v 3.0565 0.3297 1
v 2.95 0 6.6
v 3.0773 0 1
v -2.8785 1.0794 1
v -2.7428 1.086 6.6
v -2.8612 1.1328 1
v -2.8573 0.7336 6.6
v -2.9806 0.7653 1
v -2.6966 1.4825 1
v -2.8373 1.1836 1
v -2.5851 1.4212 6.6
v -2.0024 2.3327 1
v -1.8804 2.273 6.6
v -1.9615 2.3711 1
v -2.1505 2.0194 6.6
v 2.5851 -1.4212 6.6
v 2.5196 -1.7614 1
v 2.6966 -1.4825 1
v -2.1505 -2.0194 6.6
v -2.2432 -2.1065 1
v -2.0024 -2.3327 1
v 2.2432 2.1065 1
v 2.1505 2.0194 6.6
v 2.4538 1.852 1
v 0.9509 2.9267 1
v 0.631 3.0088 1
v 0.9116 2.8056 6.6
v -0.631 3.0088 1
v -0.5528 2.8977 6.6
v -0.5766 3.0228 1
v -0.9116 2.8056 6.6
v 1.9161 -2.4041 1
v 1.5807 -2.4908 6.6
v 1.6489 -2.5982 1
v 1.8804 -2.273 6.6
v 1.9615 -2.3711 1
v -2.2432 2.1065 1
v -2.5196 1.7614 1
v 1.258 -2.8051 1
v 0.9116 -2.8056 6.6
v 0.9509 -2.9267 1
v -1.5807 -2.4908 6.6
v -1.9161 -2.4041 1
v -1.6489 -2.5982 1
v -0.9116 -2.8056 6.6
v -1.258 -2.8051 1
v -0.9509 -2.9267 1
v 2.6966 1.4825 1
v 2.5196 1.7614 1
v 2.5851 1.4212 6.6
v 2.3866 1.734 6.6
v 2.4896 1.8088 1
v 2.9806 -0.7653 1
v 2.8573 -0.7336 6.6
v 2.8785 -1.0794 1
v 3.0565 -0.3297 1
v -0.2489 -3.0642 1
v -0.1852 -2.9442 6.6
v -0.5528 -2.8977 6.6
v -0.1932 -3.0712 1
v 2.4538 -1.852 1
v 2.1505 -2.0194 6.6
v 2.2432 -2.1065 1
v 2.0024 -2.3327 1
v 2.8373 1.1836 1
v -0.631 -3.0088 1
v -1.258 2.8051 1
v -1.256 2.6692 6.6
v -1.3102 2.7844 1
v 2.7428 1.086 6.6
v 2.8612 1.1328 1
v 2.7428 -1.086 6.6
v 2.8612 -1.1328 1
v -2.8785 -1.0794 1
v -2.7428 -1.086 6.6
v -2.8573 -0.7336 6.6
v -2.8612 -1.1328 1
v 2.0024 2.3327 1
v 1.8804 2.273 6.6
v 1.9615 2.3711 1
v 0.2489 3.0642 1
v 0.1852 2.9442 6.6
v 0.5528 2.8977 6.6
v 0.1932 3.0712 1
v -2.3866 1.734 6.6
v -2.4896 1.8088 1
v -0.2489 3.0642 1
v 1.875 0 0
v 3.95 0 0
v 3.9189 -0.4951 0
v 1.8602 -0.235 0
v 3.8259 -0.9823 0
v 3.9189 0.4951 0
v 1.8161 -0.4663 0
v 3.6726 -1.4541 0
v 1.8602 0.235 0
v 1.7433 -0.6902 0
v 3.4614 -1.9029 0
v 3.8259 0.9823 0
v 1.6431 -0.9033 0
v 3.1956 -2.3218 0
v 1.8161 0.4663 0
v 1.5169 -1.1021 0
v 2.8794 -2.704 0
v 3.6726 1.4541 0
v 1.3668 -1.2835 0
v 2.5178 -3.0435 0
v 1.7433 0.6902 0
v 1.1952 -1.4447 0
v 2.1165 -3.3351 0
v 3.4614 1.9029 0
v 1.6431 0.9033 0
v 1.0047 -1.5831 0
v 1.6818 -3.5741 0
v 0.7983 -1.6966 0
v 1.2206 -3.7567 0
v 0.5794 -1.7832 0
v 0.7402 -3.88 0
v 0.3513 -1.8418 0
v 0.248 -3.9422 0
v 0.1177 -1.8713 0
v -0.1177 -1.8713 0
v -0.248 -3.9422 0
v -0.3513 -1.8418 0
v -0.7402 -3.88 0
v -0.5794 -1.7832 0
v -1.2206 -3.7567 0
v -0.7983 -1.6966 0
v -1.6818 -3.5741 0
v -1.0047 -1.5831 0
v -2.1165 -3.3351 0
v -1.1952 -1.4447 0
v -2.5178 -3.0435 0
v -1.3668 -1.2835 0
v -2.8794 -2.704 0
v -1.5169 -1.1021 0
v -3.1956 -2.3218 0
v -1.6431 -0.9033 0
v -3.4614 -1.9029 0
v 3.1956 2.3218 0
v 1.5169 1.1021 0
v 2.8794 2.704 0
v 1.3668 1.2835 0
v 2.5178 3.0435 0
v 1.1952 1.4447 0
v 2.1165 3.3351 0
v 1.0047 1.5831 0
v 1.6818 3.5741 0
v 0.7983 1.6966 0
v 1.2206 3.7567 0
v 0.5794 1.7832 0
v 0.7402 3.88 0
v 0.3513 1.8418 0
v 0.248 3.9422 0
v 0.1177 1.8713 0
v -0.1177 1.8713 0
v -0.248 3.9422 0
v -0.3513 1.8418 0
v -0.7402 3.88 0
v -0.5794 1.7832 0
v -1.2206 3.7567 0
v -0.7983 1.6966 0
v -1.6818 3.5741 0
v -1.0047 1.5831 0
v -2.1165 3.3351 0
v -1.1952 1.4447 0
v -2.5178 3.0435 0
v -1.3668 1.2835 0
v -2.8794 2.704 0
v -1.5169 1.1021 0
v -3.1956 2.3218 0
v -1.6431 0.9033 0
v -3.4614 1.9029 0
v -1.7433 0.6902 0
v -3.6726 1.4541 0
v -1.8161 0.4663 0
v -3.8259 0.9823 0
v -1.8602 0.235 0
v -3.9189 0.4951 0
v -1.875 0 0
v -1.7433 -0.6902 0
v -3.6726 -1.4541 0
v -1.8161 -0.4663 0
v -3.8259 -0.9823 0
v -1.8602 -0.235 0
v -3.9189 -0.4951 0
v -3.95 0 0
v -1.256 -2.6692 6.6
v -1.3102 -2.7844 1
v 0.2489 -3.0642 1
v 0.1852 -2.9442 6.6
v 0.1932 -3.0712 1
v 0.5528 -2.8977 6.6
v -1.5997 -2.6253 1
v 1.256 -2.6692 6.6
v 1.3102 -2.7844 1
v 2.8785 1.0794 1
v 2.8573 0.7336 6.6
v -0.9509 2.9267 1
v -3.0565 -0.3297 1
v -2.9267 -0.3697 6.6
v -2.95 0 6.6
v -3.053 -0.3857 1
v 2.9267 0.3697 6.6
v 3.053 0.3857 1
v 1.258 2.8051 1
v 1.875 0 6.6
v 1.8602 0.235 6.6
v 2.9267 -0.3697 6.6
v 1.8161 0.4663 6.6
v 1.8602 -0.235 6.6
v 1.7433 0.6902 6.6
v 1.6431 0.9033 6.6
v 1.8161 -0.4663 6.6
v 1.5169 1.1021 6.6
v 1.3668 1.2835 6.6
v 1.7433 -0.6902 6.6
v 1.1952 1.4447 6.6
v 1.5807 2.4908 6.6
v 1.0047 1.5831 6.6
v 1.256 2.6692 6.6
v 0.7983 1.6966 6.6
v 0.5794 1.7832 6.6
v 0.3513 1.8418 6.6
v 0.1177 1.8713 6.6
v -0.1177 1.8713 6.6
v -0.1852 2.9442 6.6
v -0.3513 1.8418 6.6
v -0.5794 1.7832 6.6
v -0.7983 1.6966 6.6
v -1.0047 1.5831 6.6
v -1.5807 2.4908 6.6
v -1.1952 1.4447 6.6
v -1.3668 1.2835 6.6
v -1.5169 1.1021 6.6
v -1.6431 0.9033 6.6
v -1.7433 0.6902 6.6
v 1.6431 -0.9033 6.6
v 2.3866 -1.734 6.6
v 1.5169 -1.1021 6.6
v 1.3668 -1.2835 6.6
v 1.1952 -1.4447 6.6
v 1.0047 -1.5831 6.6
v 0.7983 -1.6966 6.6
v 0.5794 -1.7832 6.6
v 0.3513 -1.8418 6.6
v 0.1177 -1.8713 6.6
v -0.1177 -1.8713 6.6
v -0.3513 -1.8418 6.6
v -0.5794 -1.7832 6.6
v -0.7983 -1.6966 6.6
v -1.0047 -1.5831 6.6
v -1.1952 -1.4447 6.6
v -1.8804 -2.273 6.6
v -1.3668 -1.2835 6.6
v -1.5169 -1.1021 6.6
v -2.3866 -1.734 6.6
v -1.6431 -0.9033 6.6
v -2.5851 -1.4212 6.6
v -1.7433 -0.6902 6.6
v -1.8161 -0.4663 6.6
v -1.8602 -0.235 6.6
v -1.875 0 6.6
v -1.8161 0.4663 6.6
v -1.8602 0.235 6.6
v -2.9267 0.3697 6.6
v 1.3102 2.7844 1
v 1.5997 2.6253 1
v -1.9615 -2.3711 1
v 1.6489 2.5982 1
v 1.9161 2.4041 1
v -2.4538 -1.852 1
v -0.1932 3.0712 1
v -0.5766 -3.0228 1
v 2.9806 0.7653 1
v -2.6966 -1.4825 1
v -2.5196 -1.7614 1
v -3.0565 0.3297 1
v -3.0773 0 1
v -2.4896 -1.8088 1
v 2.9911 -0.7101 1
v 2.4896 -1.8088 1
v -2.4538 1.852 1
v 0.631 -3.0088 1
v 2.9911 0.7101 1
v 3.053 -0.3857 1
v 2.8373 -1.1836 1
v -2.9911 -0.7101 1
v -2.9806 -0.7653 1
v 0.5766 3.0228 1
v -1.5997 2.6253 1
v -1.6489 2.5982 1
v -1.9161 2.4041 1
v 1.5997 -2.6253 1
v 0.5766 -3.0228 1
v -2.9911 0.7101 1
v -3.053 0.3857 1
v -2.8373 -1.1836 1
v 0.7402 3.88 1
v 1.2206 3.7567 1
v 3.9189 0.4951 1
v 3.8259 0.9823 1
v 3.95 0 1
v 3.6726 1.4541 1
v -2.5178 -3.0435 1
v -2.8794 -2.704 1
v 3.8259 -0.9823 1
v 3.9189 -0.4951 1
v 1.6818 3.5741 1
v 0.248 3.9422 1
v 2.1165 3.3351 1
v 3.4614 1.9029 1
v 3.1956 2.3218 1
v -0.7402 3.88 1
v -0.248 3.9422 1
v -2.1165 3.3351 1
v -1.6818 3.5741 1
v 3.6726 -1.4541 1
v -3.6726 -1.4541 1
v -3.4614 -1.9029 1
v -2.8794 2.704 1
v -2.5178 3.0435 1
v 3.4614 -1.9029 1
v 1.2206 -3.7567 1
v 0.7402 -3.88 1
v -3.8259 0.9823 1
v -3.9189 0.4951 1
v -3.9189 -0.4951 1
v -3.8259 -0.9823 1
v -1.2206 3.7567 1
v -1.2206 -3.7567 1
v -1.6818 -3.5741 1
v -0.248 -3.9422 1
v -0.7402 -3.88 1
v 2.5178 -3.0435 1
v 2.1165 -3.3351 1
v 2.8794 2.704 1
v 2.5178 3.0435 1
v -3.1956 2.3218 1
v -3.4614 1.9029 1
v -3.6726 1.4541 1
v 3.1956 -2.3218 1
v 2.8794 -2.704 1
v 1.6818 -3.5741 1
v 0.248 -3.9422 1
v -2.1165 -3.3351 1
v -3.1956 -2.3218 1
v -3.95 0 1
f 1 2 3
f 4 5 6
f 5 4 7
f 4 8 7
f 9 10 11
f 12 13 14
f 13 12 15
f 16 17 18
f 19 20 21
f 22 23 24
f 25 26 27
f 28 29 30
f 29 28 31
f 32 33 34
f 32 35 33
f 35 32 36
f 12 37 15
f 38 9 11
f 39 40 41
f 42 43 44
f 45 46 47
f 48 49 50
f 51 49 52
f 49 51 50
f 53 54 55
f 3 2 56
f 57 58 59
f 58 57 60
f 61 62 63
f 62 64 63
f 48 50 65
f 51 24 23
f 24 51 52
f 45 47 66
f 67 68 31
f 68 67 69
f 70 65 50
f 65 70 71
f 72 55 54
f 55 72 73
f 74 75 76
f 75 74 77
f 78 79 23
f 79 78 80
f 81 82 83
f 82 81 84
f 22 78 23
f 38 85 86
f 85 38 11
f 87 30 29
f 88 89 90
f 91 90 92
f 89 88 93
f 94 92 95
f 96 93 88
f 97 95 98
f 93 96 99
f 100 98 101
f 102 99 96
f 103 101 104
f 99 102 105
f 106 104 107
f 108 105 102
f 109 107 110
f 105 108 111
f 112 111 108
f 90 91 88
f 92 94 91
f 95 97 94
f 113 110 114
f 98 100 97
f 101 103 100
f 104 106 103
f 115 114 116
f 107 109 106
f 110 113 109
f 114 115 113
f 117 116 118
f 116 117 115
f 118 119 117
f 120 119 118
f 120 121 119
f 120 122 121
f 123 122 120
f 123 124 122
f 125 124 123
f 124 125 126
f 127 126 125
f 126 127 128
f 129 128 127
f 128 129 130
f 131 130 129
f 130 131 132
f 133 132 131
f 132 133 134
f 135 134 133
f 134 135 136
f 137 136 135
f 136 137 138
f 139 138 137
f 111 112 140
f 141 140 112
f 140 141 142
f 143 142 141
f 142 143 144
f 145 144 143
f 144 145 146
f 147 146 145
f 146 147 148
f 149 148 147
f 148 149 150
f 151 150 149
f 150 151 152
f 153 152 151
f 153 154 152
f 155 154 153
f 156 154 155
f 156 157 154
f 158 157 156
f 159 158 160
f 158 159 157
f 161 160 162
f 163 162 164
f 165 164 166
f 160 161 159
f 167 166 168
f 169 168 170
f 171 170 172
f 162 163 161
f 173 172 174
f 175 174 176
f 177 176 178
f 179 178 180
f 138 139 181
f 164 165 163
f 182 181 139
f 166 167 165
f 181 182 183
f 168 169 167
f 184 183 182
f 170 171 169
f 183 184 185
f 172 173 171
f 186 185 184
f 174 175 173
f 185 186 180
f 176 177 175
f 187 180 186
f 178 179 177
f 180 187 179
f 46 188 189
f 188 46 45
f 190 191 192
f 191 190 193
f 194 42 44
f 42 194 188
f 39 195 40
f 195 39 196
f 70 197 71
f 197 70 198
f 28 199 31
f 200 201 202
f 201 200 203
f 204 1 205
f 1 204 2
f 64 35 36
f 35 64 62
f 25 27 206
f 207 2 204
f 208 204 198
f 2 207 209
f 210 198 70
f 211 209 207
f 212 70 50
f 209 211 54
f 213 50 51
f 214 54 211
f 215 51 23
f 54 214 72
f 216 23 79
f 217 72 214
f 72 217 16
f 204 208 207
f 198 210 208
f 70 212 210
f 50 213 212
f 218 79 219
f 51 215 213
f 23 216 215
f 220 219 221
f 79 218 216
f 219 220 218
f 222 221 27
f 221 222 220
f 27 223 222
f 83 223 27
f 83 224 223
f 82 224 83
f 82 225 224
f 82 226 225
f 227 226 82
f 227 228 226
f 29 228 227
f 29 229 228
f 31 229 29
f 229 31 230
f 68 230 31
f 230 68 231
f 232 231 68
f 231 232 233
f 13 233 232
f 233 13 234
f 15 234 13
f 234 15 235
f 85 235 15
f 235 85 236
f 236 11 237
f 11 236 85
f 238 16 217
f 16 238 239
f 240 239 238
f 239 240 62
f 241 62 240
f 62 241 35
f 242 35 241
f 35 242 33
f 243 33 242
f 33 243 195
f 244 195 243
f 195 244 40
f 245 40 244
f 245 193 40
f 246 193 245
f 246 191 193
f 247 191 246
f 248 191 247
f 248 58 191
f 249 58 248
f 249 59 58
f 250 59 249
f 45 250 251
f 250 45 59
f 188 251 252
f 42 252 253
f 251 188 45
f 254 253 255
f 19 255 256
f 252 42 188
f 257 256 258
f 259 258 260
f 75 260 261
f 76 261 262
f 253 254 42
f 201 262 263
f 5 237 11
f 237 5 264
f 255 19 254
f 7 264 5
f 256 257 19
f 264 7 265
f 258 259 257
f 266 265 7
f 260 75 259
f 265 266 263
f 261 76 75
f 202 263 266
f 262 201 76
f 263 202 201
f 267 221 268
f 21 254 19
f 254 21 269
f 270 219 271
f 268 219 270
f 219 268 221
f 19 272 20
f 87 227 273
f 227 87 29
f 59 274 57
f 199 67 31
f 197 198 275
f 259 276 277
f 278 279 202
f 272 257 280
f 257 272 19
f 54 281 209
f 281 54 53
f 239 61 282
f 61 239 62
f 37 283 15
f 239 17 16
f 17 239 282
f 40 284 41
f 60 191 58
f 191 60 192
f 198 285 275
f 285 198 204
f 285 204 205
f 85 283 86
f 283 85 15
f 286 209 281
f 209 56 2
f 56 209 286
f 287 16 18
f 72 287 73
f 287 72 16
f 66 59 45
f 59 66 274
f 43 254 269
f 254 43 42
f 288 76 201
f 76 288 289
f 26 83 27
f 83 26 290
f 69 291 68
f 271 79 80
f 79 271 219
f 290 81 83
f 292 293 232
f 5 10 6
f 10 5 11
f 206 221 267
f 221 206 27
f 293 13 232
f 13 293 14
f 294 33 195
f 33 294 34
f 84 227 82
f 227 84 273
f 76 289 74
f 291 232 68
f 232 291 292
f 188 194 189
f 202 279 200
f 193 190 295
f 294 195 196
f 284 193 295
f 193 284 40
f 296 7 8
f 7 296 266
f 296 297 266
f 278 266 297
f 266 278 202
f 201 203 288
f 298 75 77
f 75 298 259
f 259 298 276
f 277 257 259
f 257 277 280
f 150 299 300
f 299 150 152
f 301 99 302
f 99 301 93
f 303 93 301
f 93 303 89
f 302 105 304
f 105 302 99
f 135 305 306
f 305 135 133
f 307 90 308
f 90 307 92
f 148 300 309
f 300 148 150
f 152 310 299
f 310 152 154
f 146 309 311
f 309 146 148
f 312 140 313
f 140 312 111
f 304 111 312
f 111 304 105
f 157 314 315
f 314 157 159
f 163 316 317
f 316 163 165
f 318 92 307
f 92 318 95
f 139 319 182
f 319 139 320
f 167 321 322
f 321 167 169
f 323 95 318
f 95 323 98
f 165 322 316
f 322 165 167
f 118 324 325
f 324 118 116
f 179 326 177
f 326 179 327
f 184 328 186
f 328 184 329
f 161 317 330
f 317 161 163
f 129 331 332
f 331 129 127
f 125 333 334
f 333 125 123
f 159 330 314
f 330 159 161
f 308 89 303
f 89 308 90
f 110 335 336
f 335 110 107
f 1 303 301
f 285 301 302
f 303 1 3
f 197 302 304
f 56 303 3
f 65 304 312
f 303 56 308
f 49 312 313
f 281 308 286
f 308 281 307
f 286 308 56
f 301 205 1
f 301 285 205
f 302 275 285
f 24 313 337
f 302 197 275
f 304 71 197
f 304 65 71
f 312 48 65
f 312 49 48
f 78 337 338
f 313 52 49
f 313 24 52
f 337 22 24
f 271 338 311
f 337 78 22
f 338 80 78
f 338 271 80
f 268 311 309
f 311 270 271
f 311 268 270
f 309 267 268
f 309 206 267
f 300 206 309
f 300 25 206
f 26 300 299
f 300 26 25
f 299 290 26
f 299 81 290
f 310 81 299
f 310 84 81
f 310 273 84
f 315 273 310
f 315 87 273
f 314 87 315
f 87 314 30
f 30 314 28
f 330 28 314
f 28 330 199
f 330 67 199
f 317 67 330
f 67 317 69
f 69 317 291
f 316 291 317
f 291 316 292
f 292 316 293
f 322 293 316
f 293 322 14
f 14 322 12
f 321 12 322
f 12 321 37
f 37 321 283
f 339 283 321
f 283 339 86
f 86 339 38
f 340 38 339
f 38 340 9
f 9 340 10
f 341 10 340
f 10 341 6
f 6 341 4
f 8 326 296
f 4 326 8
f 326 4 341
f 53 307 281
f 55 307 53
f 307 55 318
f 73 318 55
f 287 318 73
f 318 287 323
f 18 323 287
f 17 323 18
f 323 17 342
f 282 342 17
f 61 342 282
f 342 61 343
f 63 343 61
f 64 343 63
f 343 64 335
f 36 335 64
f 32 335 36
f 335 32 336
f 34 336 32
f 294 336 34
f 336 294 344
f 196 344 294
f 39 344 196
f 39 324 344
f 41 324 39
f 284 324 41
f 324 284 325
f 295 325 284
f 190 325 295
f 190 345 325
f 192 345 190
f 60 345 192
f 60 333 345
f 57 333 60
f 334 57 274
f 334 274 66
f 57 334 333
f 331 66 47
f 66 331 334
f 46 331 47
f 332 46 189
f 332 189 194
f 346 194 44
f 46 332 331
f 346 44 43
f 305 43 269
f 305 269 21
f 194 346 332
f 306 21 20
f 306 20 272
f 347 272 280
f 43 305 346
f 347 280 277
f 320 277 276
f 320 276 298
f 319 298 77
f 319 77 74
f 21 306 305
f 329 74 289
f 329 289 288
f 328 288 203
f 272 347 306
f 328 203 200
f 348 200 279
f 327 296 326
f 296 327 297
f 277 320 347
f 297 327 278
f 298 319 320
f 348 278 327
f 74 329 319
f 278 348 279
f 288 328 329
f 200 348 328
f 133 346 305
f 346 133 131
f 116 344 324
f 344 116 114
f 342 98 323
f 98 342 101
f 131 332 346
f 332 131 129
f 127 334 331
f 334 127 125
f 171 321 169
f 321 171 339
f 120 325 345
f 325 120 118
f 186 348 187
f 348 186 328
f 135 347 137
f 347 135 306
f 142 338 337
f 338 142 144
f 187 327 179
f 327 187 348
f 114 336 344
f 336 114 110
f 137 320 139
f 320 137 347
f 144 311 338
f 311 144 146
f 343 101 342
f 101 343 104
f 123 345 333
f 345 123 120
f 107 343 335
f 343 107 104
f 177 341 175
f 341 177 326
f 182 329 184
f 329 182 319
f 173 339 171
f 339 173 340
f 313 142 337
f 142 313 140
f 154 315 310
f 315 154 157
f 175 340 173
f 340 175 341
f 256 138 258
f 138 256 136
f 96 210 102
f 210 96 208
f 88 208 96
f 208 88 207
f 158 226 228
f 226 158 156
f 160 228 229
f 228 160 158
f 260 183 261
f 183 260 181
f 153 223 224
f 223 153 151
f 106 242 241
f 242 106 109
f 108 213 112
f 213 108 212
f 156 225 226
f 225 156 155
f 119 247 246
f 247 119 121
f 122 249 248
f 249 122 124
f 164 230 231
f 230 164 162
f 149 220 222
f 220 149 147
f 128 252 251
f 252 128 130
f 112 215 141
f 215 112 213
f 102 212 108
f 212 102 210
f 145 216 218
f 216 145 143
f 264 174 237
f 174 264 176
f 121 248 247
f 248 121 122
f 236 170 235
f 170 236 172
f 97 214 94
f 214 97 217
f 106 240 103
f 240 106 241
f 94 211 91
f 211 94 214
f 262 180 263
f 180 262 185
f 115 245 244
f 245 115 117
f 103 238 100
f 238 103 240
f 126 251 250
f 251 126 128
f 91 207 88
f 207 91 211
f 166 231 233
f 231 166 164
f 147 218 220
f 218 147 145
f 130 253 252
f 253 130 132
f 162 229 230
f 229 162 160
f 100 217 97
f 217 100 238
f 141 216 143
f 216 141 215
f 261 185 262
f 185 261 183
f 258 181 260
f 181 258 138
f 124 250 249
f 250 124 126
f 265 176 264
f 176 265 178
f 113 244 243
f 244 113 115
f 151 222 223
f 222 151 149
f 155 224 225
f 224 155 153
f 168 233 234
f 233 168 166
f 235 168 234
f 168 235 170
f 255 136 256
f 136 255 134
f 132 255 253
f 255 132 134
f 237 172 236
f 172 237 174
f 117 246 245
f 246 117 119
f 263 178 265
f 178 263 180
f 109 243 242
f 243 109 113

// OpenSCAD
$fn = 50;
ov = 0.05;

d_1 = 3.75;
d_2 = 5.90;
d_a = 0.30;
h_1 = 5.6;
h_2 = 1.0;

difference() {
  union() {
    cylinder( d1 = d_2+d_a, d2=d_2,  h = h_1+h_2 );
    cylinder( d = d_2+2,             h = h_2 );
    
  }
  translate([0,0,-ov]) cylinder( d = d_1, h = h_1+h_2+2*ov );
}
